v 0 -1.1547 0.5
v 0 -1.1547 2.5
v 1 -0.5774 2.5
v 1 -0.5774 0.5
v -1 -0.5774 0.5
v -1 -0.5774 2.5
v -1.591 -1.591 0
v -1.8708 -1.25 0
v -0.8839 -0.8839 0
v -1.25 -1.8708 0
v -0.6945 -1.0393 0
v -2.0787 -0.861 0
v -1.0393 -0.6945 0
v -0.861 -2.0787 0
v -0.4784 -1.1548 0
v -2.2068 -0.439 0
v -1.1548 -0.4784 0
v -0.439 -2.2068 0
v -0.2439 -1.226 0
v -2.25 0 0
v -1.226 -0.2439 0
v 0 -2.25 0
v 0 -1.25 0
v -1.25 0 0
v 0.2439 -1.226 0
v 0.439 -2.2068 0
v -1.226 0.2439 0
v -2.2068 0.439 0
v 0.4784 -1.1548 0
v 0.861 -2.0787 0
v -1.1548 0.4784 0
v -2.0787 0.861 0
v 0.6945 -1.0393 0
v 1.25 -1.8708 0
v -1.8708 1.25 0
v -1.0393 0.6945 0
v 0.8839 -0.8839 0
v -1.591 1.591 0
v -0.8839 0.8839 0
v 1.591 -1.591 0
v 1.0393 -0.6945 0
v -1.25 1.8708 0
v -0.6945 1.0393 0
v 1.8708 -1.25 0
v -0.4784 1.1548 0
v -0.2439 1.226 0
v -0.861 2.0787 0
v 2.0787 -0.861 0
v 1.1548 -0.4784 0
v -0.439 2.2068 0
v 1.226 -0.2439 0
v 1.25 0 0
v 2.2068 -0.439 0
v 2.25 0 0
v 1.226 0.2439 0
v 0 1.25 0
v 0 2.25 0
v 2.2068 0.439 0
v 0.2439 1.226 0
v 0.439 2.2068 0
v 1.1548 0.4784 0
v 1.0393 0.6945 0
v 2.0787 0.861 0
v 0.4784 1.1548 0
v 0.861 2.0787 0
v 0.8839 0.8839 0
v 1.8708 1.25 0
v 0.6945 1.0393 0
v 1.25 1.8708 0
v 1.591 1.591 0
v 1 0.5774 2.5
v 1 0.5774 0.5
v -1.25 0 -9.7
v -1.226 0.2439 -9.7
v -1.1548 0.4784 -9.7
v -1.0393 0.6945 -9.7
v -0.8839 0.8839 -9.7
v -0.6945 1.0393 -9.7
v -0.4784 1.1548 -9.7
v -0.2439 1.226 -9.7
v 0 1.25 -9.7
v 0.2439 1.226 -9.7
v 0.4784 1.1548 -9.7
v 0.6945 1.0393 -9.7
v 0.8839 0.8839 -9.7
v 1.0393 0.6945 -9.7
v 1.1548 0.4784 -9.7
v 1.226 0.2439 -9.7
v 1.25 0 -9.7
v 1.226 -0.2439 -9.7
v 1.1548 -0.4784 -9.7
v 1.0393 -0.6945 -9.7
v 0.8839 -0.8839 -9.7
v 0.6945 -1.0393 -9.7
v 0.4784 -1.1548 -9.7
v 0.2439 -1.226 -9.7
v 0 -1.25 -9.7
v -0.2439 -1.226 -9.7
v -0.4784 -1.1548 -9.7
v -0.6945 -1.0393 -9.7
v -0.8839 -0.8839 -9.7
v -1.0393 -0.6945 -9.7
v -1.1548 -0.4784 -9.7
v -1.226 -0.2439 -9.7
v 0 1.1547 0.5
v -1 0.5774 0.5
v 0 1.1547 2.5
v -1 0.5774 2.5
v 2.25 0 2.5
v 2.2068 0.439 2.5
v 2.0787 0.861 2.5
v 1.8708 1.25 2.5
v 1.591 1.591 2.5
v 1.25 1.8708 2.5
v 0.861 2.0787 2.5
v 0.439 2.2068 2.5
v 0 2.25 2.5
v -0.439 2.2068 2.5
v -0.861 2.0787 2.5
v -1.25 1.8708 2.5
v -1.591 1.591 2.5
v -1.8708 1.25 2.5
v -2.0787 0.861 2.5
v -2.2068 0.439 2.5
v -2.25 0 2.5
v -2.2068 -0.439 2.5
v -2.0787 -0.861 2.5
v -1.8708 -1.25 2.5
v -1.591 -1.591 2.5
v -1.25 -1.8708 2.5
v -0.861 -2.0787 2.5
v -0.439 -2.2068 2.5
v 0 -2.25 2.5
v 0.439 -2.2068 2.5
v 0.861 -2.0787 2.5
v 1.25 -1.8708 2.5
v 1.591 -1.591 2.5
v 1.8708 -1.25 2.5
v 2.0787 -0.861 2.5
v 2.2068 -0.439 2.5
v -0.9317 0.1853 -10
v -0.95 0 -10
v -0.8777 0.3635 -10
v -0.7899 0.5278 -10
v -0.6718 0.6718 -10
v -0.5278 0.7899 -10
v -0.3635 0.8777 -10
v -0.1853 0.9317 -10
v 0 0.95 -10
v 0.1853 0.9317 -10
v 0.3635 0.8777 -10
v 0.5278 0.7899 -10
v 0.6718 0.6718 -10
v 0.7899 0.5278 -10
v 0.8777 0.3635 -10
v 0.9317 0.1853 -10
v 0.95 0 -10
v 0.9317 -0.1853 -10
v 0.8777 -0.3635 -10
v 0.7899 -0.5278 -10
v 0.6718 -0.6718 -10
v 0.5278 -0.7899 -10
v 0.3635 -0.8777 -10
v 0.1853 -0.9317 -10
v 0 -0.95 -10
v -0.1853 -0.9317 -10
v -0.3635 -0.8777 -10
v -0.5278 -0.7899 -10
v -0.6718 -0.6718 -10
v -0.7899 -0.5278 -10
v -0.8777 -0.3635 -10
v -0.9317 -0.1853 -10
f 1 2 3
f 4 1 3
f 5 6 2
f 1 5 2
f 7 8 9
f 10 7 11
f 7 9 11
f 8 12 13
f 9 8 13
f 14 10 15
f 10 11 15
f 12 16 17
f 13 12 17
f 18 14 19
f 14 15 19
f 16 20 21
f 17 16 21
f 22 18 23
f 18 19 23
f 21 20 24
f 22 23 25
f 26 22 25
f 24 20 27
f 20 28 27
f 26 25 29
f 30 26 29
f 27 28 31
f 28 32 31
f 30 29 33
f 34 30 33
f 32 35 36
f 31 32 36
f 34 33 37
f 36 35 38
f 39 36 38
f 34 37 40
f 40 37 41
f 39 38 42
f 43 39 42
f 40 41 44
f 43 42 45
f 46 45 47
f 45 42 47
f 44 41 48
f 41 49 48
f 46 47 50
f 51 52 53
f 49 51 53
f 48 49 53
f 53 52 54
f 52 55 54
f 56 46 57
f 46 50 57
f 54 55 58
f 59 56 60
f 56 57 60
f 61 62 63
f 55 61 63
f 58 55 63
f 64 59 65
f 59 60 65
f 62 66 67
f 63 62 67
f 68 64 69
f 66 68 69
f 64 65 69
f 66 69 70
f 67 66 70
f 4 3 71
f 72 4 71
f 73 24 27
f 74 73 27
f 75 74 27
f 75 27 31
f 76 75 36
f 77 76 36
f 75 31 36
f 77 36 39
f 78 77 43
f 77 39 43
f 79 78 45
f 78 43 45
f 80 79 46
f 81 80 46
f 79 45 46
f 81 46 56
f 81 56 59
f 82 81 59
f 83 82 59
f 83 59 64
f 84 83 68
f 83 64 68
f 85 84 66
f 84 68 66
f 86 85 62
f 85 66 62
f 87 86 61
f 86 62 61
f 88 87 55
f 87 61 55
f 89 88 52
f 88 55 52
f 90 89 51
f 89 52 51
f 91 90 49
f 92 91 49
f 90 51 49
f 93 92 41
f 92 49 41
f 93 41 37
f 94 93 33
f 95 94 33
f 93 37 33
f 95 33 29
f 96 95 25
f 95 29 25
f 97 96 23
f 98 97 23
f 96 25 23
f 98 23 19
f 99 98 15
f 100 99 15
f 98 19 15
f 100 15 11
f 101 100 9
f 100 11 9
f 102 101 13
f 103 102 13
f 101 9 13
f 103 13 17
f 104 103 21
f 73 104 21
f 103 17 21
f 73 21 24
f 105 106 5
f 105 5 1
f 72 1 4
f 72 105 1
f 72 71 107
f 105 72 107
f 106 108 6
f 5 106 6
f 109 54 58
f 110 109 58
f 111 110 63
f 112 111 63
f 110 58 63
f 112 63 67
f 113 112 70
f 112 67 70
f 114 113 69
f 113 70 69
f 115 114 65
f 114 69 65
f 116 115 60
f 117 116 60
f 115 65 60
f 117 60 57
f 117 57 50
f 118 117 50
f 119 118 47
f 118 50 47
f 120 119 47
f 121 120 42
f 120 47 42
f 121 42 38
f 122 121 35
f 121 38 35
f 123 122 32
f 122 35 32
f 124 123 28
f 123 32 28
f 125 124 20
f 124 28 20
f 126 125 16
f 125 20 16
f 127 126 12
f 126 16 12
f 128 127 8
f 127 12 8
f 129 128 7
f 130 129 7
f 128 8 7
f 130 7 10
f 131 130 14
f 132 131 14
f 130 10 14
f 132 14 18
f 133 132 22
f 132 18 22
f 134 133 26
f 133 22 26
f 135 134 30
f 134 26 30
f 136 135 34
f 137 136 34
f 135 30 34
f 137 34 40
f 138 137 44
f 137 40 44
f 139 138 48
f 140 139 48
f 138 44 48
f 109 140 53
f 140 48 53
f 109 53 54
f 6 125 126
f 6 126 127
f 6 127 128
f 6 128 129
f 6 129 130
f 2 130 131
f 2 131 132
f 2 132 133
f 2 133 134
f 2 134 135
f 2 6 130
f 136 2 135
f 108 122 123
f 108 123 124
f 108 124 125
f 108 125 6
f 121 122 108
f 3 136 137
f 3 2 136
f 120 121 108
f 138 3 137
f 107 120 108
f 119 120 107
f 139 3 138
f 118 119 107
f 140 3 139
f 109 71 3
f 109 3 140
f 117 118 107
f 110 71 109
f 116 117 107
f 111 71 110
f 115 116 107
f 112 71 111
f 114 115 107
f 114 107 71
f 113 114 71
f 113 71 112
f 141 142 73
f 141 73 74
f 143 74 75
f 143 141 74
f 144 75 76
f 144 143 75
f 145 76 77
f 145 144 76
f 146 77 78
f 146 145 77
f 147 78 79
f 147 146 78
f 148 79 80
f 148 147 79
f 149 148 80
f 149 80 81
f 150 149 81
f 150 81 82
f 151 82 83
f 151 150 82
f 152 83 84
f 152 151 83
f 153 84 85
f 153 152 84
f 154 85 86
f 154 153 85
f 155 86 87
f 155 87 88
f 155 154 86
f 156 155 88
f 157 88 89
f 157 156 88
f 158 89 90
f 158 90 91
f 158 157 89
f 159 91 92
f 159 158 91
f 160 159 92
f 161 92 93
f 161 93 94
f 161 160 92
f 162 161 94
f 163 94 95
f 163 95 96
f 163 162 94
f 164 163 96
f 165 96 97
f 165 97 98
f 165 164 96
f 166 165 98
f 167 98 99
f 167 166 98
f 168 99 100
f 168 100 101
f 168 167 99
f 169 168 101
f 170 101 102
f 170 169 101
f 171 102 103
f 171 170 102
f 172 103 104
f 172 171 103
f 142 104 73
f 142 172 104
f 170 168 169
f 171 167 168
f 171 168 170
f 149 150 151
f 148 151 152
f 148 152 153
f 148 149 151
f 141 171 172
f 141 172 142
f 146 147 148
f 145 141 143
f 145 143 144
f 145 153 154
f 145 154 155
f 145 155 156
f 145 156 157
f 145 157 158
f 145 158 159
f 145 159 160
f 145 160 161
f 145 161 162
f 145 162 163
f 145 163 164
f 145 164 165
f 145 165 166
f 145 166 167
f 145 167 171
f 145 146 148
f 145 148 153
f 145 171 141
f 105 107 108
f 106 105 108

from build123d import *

# Parameters (mm, degrees)
SKETCH1_R           = 2.25
BOSS_EXTRUDE1_DEPTH = 2.5
SKETCH2_R           = 1.25
BOSS_EXTRUDE2_DEPTH = 10
CHAMFER1_SIZE       = 0.3
CUT_EXTRUDE1_DEPTH  = 2


with BuildPart() as part:
    # Sketch1 → Boss-Extrude1 (new body)
    with BuildSketch(Plane.XY):
        Circle(SKETCH1_R)
    extrude(amount=BOSS_EXTRUDE1_DEPTH)

    # Sketch2 → Boss-Extrude2 (add)
    with BuildSketch(Plane(origin=(0, 0, 0), x_dir=(-1, 0, 0), z_dir=(0, 0, -1))):
        Circle(SKETCH2_R)
    extrude(amount=BOSS_EXTRUDE2_DEPTH)

    # Chamfer1
    chamfer1_edges = [part.edges().sort_by_distance(p)[0] for p in [
        (1.25, 0, -10),
    ]]
    chamfer(chamfer1_edges, length=CHAMFER1_SIZE)

    # Sketch3 → Cut-Extrude1 (cut)
    with BuildSketch(Plane.XY.offset(2.5)):
        Polygon((0, 1.154700538), (-1, 0.577350269), (-1, -0.577350269), (0, -1.154700538), (1, -0.577350269), (1, 0.577350269), align=None)
    extrude(amount=-CUT_EXTRUDE1_DEPTH, mode=Mode.SUBTRACT)


solid = part.part
